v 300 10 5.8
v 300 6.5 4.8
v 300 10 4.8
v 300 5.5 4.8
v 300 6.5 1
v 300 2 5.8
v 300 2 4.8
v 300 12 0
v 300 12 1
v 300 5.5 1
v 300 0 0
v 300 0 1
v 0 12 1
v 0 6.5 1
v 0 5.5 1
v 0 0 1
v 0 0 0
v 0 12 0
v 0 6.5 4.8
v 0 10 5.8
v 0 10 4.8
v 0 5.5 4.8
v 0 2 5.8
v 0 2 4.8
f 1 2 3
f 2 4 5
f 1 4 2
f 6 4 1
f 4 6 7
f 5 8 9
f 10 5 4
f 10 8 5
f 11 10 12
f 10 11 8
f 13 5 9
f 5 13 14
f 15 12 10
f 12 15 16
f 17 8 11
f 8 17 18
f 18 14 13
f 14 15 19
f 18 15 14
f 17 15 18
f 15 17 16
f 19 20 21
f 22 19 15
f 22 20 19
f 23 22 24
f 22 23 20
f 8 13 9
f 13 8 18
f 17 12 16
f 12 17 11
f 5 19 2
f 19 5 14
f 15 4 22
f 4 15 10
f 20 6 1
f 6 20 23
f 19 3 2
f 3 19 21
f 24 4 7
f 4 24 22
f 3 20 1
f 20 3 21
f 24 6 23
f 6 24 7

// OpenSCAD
// file: rail.scad
include <parameters.scad>

// Fixed H rail. Overlap is confined to the web ends; the two flange inner
// faces stay exactly at Z=wall and Z=depth-wall (4 mm apart for the new rail).
module rail_geometry(length=rail_length, height=rail_height,
                     depth=rail_depth_target, front_height=rail_front_height,
                     wall=wall_thickness, web=wall_thickness) {
    front_y0 = (height-front_height)/2;
    web_y0 = (height-web)/2;
    assert(length>0 && height>=front_height && front_height>web);
    assert(depth>2*wall && wall>join_overlap && web>0);
    union() {
        // Cabinet mounting base; its rear face is exactly Z=0.
        cube([length, height, wall]);

        // Central web. It overlaps the base and flange by join_overlap.
        translate([0, web_y0, wall-join_overlap])
            cube([length, web, depth-2*wall+2*join_overlap]);

        // Person-facing load flange.
        translate([0, front_y0, depth-wall])
            cube([length, front_height, wall]);
    }
}

module rail_section_preview(section_x=20) {
    intersection() {
        rail_geometry();
        translate([rail_length / 2 - section_x / 2, -1, -1])
            cube([section_x, rail_height + 2, rail_depth_target + 2]);
    }
}

// Standalone printable entry point. debug_section is intentionally a source
// inspection mode, not a modifier on the final print geometry.
if (debug_section)
    rail_section_preview();
else
    rail_geometry();
// main file
// NEW rail for REUSING the already printed v1 hooks. Units mm.
// NOT the user's measured 12/12 x 6/4 H rail: rear wing=12, front wing=8,
// outside depth=5.8, inside separation=3.8, wings/web=1.
include <parameters.scad>
use <rail.scad>

legacy_rail_length = 300;
rail_geometry(length=legacy_rail_length, height=12, depth=5.8,
              front_height=8, wall=1, web=1);
